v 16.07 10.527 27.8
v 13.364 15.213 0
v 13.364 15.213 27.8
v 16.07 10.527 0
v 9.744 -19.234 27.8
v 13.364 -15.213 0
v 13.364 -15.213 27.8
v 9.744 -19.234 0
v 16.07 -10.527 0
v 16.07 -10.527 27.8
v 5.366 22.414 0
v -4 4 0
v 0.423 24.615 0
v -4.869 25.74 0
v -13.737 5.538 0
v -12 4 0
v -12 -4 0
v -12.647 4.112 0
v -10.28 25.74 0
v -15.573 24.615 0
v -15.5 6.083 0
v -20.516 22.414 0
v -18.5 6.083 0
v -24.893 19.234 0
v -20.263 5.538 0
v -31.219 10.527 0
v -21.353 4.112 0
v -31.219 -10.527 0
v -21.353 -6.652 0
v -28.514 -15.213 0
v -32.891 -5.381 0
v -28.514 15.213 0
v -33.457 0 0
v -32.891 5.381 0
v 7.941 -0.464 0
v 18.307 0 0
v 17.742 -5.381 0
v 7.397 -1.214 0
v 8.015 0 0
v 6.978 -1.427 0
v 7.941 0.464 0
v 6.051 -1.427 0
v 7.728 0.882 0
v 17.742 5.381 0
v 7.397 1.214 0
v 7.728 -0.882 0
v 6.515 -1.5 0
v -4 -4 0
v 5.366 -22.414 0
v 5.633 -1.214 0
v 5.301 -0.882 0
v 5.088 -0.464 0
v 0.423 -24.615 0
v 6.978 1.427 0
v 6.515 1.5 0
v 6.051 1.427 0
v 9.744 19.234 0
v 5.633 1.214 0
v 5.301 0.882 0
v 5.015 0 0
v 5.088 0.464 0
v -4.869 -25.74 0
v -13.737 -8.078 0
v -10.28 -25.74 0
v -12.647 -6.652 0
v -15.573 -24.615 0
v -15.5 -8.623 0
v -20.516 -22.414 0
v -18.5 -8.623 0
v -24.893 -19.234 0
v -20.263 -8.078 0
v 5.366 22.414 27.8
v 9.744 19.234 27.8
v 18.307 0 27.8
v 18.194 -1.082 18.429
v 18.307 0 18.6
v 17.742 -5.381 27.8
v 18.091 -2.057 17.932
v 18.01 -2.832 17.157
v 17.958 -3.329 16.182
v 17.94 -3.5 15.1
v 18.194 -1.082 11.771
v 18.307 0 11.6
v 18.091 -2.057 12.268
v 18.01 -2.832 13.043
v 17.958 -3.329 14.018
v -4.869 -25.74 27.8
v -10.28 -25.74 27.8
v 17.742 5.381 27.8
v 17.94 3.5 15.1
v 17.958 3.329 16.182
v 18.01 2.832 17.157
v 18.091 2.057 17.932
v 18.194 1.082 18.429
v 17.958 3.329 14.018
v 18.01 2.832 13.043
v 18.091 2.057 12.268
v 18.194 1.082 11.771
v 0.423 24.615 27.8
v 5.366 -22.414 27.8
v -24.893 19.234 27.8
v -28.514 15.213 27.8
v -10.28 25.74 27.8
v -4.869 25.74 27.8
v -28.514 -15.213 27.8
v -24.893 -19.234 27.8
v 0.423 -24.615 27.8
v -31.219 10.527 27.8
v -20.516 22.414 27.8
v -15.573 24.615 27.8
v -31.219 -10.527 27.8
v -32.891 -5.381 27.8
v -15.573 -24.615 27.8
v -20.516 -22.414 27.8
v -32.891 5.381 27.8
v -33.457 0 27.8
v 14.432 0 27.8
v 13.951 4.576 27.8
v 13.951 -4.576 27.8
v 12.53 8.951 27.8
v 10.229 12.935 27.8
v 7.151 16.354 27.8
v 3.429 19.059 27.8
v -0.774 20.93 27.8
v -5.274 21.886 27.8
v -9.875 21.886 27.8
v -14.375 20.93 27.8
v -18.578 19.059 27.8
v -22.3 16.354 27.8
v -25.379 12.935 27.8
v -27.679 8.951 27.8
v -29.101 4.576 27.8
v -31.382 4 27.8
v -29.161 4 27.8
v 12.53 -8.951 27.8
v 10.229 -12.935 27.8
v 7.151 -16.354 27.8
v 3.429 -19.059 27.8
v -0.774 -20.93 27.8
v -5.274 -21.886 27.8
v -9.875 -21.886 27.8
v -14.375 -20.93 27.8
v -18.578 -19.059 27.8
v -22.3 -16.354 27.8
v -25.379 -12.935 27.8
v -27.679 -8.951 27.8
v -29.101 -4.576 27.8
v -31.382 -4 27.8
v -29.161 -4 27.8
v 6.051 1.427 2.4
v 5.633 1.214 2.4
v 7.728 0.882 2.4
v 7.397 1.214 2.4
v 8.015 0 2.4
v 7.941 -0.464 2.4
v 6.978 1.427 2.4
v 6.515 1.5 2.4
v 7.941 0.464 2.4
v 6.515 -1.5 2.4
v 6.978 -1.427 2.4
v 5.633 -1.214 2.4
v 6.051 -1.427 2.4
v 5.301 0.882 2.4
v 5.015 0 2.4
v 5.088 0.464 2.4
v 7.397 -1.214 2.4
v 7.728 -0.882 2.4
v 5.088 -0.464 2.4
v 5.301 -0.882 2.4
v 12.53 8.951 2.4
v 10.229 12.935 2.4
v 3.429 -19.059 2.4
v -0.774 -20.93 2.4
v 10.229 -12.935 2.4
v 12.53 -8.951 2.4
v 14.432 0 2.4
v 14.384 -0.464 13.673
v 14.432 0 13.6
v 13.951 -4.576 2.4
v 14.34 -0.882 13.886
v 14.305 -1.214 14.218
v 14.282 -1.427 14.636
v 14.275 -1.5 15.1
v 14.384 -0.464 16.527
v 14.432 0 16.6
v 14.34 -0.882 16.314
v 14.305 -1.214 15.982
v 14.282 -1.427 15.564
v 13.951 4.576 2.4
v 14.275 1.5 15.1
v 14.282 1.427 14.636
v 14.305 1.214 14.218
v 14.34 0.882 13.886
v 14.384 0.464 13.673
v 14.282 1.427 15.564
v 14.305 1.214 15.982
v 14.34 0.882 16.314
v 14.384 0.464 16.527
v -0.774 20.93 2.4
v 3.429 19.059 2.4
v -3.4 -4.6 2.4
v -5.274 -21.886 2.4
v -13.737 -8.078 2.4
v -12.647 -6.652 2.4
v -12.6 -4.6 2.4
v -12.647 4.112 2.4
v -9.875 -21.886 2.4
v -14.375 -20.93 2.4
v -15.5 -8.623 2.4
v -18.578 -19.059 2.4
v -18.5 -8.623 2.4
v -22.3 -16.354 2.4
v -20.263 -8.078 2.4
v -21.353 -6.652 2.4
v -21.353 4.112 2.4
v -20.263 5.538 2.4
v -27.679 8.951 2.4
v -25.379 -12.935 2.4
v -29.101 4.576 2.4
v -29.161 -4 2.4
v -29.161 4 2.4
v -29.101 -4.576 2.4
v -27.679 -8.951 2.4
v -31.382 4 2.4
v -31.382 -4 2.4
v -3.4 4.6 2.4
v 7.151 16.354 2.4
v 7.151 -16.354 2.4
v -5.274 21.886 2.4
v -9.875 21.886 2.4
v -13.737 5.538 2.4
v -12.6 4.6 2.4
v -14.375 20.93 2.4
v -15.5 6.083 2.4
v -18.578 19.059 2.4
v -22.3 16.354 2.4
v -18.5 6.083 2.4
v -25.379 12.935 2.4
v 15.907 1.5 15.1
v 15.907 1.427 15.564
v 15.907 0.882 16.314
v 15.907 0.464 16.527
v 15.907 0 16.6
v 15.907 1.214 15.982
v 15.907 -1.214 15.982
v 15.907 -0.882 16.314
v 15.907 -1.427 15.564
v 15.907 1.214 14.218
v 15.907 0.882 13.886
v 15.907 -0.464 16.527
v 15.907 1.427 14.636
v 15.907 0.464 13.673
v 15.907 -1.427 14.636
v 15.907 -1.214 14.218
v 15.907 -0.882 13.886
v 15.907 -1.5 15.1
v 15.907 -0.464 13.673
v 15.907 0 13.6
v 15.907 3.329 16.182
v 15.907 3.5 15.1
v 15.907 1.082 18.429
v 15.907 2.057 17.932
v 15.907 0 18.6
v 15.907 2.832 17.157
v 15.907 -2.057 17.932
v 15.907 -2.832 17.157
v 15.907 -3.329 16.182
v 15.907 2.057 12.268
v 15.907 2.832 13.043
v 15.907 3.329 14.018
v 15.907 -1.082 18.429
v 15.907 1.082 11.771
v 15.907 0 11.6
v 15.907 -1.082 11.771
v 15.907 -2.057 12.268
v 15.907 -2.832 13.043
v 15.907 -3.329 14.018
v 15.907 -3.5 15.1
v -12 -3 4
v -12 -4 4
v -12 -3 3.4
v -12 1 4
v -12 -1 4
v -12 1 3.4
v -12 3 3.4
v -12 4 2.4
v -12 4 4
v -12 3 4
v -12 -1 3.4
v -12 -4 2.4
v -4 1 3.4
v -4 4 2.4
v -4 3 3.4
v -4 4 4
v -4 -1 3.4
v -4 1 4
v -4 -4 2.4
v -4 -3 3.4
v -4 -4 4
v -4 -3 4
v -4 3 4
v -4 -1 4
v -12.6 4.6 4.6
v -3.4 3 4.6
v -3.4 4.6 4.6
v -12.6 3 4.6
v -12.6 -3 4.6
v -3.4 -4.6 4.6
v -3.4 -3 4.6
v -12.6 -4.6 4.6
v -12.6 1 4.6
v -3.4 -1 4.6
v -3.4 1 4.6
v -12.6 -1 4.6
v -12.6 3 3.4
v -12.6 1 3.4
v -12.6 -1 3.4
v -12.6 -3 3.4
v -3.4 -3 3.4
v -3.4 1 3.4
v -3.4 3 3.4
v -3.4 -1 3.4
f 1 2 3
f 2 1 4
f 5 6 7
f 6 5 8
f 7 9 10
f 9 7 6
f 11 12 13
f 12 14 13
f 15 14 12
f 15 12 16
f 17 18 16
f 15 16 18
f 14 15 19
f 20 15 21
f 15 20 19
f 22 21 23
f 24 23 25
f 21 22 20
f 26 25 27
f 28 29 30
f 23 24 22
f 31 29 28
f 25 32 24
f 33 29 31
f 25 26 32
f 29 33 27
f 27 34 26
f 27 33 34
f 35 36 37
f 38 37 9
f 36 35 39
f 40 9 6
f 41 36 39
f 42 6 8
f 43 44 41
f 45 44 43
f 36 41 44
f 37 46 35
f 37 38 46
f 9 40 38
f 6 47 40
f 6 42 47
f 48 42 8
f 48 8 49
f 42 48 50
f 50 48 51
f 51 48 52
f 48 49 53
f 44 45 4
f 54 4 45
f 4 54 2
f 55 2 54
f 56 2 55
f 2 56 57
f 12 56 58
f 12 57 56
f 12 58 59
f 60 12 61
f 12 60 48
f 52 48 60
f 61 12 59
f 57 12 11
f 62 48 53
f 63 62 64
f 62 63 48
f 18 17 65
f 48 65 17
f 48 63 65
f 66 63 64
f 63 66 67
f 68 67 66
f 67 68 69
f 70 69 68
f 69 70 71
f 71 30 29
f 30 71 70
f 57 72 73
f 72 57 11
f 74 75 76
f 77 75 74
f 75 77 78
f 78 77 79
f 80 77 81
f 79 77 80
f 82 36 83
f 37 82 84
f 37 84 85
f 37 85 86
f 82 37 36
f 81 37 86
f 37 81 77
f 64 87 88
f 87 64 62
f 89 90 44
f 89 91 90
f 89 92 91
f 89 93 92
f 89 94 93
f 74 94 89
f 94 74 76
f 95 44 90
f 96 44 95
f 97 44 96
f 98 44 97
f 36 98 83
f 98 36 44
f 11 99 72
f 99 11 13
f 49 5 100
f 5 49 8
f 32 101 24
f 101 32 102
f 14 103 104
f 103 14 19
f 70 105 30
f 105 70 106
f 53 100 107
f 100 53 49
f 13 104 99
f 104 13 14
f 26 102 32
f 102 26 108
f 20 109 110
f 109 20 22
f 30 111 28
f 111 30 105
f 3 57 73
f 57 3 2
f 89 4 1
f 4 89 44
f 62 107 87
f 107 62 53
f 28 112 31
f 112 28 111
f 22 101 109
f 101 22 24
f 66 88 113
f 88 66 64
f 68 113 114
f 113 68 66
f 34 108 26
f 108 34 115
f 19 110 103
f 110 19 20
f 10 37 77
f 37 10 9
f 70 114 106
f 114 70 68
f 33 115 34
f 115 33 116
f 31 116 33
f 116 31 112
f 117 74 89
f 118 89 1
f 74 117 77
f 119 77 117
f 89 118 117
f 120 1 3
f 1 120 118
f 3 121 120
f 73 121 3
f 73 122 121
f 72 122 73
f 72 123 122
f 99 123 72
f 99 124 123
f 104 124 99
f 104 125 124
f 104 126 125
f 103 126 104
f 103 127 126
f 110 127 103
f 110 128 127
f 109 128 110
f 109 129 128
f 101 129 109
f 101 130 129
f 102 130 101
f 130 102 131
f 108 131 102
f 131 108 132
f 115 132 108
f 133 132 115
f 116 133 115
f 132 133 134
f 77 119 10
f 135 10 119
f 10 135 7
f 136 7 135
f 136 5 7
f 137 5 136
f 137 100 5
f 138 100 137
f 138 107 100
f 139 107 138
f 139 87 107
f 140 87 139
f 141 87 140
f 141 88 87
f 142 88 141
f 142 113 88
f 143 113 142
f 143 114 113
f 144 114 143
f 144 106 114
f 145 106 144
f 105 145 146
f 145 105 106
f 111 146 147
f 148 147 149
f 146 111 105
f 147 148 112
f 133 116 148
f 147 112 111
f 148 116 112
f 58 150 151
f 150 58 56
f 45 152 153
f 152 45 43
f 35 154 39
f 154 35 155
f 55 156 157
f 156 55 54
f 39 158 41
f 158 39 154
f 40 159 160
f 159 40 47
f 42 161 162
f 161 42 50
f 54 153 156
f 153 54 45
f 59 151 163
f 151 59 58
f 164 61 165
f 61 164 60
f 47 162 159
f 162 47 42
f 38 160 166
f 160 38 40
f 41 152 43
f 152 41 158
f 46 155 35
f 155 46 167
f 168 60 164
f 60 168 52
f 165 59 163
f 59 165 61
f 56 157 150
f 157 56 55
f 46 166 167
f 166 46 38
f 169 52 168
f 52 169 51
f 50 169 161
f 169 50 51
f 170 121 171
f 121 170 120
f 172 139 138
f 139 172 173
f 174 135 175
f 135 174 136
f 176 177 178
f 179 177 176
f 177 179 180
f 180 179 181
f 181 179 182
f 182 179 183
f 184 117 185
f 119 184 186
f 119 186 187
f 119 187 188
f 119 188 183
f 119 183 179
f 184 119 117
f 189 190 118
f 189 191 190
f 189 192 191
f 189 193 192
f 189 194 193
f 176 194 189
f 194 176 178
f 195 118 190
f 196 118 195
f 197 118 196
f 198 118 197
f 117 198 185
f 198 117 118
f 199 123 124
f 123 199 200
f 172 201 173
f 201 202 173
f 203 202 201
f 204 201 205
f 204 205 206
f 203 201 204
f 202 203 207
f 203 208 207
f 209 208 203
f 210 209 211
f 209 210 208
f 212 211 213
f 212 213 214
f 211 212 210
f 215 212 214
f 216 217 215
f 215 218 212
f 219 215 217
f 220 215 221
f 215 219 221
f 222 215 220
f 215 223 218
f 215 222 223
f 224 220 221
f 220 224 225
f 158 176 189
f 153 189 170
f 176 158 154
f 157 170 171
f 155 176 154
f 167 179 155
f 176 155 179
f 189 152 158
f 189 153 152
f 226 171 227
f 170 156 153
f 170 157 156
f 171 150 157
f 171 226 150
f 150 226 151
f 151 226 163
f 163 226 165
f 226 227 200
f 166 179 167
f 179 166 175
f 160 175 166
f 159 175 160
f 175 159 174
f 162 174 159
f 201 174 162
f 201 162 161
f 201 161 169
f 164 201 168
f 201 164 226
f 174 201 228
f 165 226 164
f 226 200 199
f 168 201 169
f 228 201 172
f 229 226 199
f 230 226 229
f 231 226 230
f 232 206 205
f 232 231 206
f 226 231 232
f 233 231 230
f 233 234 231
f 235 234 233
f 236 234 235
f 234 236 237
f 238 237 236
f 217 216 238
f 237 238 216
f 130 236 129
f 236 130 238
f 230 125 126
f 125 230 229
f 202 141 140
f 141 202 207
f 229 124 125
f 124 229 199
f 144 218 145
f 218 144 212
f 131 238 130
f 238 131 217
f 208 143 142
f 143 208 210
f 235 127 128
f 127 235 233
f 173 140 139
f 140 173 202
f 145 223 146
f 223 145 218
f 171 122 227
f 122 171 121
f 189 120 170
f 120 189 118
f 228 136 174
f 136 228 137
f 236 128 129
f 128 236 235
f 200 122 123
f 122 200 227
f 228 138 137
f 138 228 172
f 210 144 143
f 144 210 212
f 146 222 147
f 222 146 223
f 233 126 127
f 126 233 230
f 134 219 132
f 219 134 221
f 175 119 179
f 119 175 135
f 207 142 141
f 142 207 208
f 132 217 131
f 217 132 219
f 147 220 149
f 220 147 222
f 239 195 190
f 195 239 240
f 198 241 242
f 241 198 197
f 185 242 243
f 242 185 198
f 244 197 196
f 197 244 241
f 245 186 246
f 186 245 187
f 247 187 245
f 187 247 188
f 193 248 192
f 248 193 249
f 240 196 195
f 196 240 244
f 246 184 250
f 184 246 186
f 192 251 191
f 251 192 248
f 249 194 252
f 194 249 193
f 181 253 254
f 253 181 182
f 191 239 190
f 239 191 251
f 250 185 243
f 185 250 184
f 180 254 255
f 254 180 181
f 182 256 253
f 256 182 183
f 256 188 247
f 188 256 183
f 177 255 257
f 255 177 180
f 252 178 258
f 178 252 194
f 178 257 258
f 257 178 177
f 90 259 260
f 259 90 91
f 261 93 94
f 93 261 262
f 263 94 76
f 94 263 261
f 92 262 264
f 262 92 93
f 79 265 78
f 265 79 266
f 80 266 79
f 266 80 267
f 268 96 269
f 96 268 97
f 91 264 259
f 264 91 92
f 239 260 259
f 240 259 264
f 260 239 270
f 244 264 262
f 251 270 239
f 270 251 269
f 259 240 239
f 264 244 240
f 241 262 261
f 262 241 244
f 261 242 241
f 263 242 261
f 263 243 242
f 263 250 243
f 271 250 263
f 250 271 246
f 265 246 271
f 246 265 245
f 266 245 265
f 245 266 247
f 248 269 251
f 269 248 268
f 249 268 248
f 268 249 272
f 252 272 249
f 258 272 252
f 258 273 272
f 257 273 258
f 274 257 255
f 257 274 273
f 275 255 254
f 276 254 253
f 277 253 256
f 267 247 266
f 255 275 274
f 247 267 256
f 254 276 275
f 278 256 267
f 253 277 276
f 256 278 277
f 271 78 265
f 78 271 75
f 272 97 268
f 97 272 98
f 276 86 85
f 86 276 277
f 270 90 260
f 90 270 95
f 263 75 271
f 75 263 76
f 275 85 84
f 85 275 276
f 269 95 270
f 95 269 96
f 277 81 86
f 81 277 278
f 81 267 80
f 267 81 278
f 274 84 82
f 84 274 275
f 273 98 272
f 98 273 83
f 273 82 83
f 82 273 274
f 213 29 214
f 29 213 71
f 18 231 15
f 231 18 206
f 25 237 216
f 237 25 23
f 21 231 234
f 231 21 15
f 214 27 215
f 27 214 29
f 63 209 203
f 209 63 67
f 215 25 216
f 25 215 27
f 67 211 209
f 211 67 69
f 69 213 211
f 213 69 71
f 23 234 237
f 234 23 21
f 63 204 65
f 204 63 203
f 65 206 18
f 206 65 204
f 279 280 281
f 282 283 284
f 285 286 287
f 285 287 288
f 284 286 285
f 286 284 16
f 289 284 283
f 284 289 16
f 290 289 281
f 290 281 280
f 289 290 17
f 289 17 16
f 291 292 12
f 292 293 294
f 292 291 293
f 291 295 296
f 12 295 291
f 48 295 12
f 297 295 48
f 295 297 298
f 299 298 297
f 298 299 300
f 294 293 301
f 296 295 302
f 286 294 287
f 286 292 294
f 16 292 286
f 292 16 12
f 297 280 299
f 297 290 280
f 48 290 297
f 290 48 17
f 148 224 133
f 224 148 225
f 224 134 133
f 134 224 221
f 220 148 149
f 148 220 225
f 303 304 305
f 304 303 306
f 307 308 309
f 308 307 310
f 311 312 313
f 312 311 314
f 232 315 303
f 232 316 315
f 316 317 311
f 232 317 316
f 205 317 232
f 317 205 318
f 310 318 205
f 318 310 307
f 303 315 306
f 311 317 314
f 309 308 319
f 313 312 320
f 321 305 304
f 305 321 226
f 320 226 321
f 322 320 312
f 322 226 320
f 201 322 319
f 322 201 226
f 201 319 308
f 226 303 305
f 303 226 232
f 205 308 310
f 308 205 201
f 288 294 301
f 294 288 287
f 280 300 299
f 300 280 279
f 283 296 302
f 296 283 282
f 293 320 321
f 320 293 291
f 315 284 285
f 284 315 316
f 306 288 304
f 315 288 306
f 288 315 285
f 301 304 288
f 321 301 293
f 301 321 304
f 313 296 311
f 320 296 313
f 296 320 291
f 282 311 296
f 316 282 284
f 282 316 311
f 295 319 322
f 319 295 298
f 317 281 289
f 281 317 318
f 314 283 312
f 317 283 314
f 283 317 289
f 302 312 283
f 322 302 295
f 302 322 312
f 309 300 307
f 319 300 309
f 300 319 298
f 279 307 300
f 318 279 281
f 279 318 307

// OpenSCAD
// file: common.scad
// units are in mm in keeping with OpenSCAD STL export behavior
// multiplying a dimension in inches by the `inch` variable
// produces the equivalent dimension in mm
inch = 25.4;

thick = 0.6; // 3D printer layer height / line thickness. This should not be changed.

// ABS pipe standard dimensions for nominal 1.25 inch pipe
// diameters
pipe_OD = 1.660 * inch;
pipe_ID = 1.385 * inch;
// radii
pipe_OR = pipe_OD/2;
pipe_IR = pipe_ID/2;

// PCB dimensions and mounting hole spacing
PCBX = 6.400 * inch;
PCBY = 1.250 * inch;
PCBZ = 1.6; // thickness, confirm with PCB fab service
mount_hole_spacing = 0.500 * inch;
mount_hole_start = 0.250 * inch;

// to facilitate 3D printing the skeleton for a single T-Stick
// is broken into several parts, which I here refer to as "modules"
skeleton_module_length = 6 * inch;
skeleton_face_thickness = 3 * thick; // 1.8mm
connector_thickness = 3 * thick; // 1.8mm
connector_width = 15;
connector_length = skeleton_module_length*2/3;
// right angle triangle with base PCBY/2 and hypotenuse pipe_IR has height...
cylinder_top_cut_height_offset = sqrt(pipe_IR*pipe_IR - (PCBY/2)*(PCBY/2));
skeleton_module_total_thickness = pipe_IR - cylinder_top_cut_height_offset;

// hardware
// these should probably be oversized or parameterized
// to allow press fit vs loose fit
M3_hole_diameter = 3;
M3_hole_diameter_loose = 3.3;
M3_nut_height = 2.4;
M3_head_diameter = 7;
M3_head_height = 3;
M3_nut_circumcircle_diameter = 6;
heatshrink_thickness = 5/8;

module M3_nut_volume(rotation=0, scaling=1)
{
    scale([scaling, scaling, scaling]) rotate([0,0,rotation])
        cylinder(h = M3_nut_height, d = M3_nut_circumcircle_diameter, $fn=6);
}

module pipe_volume(radius, length=skeleton_module_length)
{
    translate([0,0,cylinder_top_cut_height_offset])
            rotate([0,90,0])
                cylinder(h = length, r = radius);
}

module pipe_ID_volume(length=skeleton_module_length)
{
    pipe_volume(pipe_IR, length);
}

module pipe_OD_volume(length=skeleton_module_length)
{
    pipe_volume(pipe_OR, length);
}

module pipe_top_area()
{
    translate([-500,-500,0])
        cube([1000,1000,1000]);
}

module skeleton_module_volume(length=skeleton_module_length)
{
    skeleton_fit_shrink = 0.4; // so that the skeleton fits flush inside the pipe
    difference()
    {
        pipe_volume(pipe_IR-skeleton_fit_shrink, length);
        pipe_top_area();
    }
}

module screw_holes(diameter=M3_hole_diameter)
{
    union()
    {
        for(x = [mount_hole_start : mount_hole_spacing : skeleton_module_length - 1])
        {
            translate([x, 0, -500])
                cylinder(h = 1000, d = diameter, $fn=20);
        }
    }
}

axial_screw_hole_offset = cylinder_top_cut_height_offset-pipe_ID/2+M3_head_diameter/2;
module axial_screw_hole(diameter=M3_hole_diameter, length=1000, center=true, xoffset=0)
{
    translate([xoffset,0,axial_screw_hole_offset])
        rotate([0,90,0])
            cylinder(length, r=diameter/2, $fn=20, center=center);
}

module top_axial()
{
    translate([0,0,cylinder_top_cut_height_offset])
        rotate([180,0,0])
            translate([0,0,-cylinder_top_cut_height_offset])
                children();
}
// file: endcap.scad
include <common.scad>

endcap_min_wall = 4*thick;
endcap_IR_fit_tolerance = 0.3;
endcap_OR = pipe_OR + 8*thick;
endcap_IR = pipe_OR + heatshrink_thickness + endcap_IR_fit_tolerance;

module endcap_volume()
{
    translate([-endcap_min_wall,0,0]) intersection()
    {
        pipe_volume(endcap_OR);
        translate([0, -500, -500]) cube([inch + endcap_min_wall, 1000, 1000]);
    }
}

module endcap_cavity()
{
    pipe_volume(endcap_IR);
}

module plain_endcap()
{
    difference()
    {
        endcap_volume();
        axial_screw_hole();
        endcap_cavity();
    }
}
// main file
include <endcap.scad>

buttonX = 8;
buttonY = buttonX;
buttonZ = 4;
button_vertical_offset = 8;
button_leg_slot_offset = 2; // offset in from left/right side of button recess
button_leg_slot_width = 2;
button_leg_slot_length = buttonY+2;
button_pocket_min_wall = 1*thick;

USB_cutout_width = 9;
USB_cutout_length = 15;
USB_cutout_corner_radius = 3;
USB_cutout_vertical_offset = 17;
USB_cutout_horizontal_offset = -0.5*inch/10;

module USB_cutout()
{
    d = 2*USB_cutout_corner_radius;
    r = USB_cutout_corner_radius;
    y = USB_cutout_length-d;
    translate([0,USB_cutout_horizontal_offset,USB_cutout_vertical_offset]) minkowski()
    {
        translate([-500,-y/2,-(USB_cutout_width-d)/2]) cube([1000,y,USB_cutout_width-d]);
        sphere(r);
    }
}

module button_slot()
{
    translate([ -(endcap_min_wall+thick)
              , -buttonX/2
              , button_vertical_offset-buttonY/2
              ])
    cube([buttonZ+thick, buttonX, buttonY]);
}

module button_leg_slot()
{
    translate([ buttonZ-(endcap_min_wall+button_pocket_min_wall)
              , button_leg_slot_offset-(button_leg_slot_width/2)
              , button_vertical_offset-(button_leg_slot_length/2)
              ])
        cube([ 2*button_pocket_min_wall
             , button_leg_slot_width
             , button_leg_slot_length
             ]);
}

module button_pocket()
{
    m = button_pocket_min_wall;
    x = buttonX + 2 * m;
    y = buttonY + 2 * m;
    z = buttonZ + m;
    difference()
    {
        translate([ -(endcap_min_wall)
                  , -x/2
                  , button_vertical_offset-y/2
                  ])
            cube([z, x, y]);
        button_slot();
        button_leg_slot();
        mirror([0,1,0]) button_leg_slot();
    }
}

module FSR_wire_slot()
{
    w = 8;
    t = 3*thick;
    translate([0,-w/2,endcap_IR+cylinder_top_cut_height_offset-1]) cube([1000,w,t+1]);
}

module anti_rotation_screw_hole()
{
    translate([0.5*inch, 0, -1000]) cylinder(d=M3_hole_diameter, h=1000, $fn=20);
    translate([0.5*inch, 0, -1000 - endcap_OR + cylinder_top_cut_height_offset + 4*thick]) cylinder(d=M3_head_diameter, h=1000, $fn=20);
}

module proximal_endcap()
{
    union()
    {
        difference()
        {
            plain_endcap();
            USB_cutout();
            button_slot();
            FSR_wire_slot();
            anti_rotation_screw_hole();
        }
        button_pocket();
    }
}

translate([0,0,endcap_min_wall]) rotate([0,-90,0]) proximal_endcap();
//proximal_endcap();
